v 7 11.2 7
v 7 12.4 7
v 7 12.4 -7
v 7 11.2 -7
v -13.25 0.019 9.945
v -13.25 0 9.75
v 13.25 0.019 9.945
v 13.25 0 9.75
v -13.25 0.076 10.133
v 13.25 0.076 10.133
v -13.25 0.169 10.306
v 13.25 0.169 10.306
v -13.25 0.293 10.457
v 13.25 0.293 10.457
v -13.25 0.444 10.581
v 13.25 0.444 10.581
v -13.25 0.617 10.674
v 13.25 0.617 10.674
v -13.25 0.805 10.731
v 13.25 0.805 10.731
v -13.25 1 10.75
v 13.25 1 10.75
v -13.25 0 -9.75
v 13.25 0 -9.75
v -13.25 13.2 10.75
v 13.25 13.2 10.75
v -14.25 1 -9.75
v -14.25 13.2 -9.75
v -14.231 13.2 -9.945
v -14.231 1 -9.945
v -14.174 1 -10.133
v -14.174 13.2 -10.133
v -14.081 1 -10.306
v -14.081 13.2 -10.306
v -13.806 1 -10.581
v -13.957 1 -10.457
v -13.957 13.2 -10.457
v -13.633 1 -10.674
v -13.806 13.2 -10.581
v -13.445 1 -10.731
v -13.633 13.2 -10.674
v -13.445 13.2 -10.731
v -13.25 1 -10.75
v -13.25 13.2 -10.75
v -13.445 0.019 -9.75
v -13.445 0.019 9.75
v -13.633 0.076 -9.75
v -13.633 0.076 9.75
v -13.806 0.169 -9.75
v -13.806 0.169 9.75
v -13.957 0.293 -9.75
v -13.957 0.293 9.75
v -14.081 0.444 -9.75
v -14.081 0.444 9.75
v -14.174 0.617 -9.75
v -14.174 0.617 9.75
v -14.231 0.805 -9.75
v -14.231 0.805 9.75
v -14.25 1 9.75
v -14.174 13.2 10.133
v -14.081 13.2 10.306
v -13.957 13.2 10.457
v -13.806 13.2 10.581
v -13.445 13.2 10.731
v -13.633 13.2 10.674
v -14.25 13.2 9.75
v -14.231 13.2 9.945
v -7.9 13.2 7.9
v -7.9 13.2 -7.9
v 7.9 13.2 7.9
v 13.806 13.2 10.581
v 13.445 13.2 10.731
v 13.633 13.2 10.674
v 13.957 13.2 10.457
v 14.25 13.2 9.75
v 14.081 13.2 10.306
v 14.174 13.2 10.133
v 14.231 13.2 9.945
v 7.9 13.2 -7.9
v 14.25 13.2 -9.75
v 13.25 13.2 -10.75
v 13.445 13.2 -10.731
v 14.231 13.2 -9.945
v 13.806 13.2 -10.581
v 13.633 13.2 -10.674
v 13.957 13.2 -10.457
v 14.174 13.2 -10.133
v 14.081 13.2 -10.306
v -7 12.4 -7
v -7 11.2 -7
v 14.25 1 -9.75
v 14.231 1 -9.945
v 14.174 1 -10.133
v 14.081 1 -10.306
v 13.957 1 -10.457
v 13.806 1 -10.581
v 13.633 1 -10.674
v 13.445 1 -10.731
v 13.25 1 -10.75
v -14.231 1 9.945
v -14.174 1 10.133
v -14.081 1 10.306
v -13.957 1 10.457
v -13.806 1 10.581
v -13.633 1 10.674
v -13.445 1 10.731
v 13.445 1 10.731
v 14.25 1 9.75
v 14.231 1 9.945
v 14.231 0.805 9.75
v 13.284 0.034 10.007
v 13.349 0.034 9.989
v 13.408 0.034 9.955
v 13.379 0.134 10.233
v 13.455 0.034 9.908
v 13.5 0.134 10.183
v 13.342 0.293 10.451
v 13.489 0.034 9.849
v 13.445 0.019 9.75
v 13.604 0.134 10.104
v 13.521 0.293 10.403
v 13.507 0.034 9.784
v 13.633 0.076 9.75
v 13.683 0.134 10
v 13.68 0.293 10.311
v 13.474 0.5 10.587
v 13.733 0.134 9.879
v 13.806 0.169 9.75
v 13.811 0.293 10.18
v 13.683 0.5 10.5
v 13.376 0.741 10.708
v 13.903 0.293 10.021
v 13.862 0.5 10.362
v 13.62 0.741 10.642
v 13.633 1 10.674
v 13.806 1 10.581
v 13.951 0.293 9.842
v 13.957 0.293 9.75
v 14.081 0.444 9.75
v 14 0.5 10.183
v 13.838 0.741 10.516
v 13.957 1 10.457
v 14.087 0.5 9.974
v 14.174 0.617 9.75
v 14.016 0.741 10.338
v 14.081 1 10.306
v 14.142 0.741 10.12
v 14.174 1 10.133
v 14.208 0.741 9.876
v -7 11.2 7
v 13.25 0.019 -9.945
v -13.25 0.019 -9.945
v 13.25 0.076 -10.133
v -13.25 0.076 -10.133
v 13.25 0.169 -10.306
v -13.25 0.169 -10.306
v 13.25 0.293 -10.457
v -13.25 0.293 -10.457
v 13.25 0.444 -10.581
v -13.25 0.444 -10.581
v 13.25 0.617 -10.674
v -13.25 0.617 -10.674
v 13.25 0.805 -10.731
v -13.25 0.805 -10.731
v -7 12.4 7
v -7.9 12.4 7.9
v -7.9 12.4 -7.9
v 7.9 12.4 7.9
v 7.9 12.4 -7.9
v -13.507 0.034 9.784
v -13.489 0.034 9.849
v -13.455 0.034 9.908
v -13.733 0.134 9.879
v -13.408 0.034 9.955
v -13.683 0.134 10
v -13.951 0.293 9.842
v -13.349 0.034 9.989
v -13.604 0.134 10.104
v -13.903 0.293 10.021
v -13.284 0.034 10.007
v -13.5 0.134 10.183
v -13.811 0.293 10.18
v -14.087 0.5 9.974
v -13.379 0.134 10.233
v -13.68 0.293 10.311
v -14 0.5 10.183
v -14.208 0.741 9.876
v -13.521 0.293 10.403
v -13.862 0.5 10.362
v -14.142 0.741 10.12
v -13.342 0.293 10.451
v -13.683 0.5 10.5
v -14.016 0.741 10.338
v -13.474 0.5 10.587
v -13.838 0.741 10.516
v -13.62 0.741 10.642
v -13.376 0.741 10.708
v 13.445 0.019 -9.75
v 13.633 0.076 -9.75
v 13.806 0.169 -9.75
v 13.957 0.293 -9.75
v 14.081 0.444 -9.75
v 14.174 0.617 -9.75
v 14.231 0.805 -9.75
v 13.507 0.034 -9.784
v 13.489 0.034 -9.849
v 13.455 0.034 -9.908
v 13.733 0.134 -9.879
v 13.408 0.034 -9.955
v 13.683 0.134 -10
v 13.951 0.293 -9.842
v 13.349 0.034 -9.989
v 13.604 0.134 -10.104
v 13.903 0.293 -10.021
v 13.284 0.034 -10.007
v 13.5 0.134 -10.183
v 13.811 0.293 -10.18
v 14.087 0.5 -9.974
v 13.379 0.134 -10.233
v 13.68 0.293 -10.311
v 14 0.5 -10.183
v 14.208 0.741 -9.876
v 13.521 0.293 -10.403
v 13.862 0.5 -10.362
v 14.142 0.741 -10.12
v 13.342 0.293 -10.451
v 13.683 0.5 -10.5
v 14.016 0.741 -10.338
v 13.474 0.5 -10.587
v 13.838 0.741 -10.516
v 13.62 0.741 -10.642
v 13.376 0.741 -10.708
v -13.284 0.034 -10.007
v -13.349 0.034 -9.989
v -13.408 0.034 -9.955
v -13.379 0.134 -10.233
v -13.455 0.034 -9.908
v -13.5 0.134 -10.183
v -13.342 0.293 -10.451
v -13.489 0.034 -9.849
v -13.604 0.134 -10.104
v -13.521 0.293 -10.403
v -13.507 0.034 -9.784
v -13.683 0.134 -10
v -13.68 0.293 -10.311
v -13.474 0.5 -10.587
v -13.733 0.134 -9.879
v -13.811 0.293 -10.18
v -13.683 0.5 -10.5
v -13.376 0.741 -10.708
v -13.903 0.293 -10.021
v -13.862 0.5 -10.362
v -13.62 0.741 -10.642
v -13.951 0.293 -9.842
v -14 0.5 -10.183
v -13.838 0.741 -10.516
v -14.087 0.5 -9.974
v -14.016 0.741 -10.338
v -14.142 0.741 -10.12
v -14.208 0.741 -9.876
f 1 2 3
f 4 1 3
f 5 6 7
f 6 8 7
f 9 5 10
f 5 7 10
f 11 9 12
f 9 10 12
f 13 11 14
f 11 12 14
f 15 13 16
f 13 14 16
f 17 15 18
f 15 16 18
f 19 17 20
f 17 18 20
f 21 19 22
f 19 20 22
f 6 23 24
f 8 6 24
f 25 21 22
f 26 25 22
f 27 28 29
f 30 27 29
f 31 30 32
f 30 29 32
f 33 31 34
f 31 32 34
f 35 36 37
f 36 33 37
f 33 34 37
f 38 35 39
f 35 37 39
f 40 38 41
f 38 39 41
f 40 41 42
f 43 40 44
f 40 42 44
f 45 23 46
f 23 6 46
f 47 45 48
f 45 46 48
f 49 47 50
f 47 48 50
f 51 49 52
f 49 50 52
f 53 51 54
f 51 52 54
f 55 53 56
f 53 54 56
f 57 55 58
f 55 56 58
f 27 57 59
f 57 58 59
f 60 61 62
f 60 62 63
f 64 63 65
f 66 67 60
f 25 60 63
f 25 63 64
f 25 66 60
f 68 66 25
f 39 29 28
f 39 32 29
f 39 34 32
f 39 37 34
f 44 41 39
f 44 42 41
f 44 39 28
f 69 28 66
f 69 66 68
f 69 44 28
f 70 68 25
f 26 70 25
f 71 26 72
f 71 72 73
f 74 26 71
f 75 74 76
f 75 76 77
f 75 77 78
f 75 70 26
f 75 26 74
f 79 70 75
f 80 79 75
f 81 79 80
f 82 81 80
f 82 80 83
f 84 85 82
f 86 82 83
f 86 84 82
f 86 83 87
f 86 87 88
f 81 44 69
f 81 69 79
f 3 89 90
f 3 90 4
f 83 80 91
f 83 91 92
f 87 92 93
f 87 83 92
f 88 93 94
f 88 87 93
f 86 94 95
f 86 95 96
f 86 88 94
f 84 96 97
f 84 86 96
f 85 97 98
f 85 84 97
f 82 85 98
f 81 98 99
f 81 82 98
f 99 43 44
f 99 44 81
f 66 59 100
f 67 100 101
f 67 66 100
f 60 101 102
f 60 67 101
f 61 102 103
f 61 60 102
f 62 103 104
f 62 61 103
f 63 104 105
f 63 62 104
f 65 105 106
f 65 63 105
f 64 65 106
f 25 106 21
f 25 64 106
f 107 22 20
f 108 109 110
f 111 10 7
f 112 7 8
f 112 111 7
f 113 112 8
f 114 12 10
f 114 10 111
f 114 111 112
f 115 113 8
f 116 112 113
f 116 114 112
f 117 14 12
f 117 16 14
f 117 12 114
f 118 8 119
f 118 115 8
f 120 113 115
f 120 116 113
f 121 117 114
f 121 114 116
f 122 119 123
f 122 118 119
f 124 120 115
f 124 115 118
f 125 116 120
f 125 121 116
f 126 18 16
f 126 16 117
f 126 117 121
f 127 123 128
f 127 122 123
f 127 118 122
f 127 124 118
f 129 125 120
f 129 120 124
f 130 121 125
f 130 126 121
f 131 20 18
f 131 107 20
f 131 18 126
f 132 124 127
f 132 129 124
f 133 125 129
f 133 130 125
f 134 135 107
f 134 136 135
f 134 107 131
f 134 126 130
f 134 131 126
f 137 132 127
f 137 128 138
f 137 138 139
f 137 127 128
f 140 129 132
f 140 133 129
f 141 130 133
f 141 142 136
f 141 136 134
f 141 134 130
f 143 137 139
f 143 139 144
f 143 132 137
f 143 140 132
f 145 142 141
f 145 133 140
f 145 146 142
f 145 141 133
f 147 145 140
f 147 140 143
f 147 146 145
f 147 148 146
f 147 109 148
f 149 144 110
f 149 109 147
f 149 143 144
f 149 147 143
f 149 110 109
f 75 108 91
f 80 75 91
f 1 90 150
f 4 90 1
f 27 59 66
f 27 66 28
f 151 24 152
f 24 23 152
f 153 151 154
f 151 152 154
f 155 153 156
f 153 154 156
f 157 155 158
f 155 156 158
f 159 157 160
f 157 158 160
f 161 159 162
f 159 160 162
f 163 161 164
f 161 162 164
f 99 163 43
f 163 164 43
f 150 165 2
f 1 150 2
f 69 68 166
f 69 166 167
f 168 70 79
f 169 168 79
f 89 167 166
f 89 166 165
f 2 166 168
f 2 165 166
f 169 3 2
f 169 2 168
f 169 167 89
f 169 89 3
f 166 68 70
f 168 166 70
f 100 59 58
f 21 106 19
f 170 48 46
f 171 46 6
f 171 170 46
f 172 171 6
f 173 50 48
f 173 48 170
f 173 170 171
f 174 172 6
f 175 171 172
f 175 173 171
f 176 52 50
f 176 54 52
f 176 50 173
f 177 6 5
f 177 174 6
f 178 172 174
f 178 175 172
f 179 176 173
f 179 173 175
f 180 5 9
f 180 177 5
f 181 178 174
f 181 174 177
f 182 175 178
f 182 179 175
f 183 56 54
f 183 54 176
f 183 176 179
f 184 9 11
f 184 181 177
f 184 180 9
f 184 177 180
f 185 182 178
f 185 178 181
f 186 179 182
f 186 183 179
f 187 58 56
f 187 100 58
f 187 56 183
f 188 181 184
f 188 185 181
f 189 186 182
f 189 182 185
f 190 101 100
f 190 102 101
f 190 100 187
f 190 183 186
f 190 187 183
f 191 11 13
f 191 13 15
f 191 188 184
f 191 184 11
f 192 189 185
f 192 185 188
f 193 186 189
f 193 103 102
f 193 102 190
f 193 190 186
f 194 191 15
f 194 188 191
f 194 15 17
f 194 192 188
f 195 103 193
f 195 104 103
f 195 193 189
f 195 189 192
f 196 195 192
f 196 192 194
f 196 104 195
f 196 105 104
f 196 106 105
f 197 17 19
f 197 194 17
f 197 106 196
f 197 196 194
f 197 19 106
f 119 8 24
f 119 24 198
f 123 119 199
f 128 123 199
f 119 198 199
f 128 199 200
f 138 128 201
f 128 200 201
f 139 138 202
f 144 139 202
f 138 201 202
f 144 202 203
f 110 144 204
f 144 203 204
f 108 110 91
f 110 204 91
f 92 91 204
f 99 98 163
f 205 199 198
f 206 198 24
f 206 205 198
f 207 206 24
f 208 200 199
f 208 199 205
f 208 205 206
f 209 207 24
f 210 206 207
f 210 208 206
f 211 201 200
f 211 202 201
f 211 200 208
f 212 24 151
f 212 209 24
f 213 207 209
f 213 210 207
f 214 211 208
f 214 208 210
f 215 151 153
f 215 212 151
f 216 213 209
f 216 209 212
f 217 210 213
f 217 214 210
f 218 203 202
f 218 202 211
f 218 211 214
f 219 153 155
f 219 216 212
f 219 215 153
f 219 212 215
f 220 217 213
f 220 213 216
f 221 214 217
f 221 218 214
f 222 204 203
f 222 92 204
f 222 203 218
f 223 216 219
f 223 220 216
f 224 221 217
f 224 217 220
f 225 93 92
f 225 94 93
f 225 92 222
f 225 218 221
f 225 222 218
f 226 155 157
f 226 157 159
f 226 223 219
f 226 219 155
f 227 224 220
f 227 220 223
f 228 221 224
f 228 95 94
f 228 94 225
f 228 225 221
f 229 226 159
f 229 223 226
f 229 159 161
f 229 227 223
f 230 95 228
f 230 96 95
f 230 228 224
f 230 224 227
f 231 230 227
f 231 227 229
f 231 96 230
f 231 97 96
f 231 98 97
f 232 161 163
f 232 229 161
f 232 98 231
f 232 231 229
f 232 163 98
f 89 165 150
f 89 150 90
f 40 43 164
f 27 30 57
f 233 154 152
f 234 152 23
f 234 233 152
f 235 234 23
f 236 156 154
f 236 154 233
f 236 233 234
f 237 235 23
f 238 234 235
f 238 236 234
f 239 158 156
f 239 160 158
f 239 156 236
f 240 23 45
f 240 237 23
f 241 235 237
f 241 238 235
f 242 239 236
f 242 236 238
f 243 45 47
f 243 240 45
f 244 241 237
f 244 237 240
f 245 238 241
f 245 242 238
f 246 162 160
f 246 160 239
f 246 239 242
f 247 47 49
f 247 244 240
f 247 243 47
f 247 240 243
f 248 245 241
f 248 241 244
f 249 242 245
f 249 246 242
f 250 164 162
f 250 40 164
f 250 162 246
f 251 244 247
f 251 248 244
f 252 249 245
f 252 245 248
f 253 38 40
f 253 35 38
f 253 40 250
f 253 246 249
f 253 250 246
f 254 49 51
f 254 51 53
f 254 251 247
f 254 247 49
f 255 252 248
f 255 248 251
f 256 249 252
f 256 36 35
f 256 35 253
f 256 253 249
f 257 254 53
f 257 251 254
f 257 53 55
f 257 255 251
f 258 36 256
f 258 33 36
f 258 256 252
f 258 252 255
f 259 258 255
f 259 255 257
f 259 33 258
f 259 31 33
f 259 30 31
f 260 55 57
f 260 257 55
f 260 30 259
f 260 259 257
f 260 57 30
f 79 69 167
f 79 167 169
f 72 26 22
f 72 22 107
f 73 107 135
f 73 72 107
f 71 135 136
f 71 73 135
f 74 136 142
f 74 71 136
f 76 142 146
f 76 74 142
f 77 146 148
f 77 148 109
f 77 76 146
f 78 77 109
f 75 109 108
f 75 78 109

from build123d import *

# Parameters (mm, degrees)
SKETCH_1_W          = 28.5
SKETCH_1_H          = 21.5
EXTRUDE_1_DEPTH     = 13.2
FILLET_1_R          = 1
SKETCH_3_W          = 14
SKETCH_3_H          = 14
CUT_EXTRUDE_2_DEPTH = 2
SKETCH_4_W          = 15.8
SKETCH_4_H          = 15.8
CUT_EXTRUDE_3_DEPTH = 0.8
FILLET_2_R          = 1


with BuildPart() as part:
    # 草图1 → 凸台-拉伸1 (new body)
    with BuildSketch(Plane(origin=(0, 0, 0), x_dir=(1, 0, 0), z_dir=(0, 1, 0))):
        Rectangle(SKETCH_1_W, SKETCH_1_H)
    extrude(amount=EXTRUDE_1_DEPTH)

    # 圆角1
    fillet_1_edges = [part.edges().sort_by_distance(p)[0] for p in [
        (14.25, 6.6, 10.75),
        (-14.25, 6.6, 10.75),
        (-14.25, 6.6, -10.75),
        (14.25, 6.6, -10.75),
    ]]
    fillet(fillet_1_edges, radius=FILLET_1_R)

    # 草图3 → 切除-拉伸2 (cut)
    with BuildSketch(Plane(origin=(0, 13.2, 0), x_dir=(1, 0, 0), z_dir=(0, 1, 0))):
        Rectangle(SKETCH_3_W, SKETCH_3_H)
    extrude(amount=-CUT_EXTRUDE_2_DEPTH, mode=Mode.SUBTRACT)

    # 草图4 → 切除-拉伸3 (cut)
    with BuildSketch(Plane(origin=(0, 13.2, 0), x_dir=(1, 0, 0), z_dir=(0, 1, 0))):
        Rectangle(SKETCH_4_W, SKETCH_4_H)
    extrude(amount=-CUT_EXTRUDE_3_DEPTH, mode=Mode.SUBTRACT)

    # 圆角2
    fillet_2_edges = [part.edges().sort_by_distance(p)[0] for p in [
        (14.25, 0, 0),
        (0, 0, 10.75),
        (-14.25, 0, 0),
        (0, 0, -10.75),
        (13.957106781, 0, -10.457106781),
        (-13.957106781, 0, -10.457106781),
        (-13.957106781, 0, 10.457106781),
        (13.957106781, 0, 10.457106781),
    ]]
    fillet(fillet_2_edges, radius=FILLET_2_R)


solid = part.part
